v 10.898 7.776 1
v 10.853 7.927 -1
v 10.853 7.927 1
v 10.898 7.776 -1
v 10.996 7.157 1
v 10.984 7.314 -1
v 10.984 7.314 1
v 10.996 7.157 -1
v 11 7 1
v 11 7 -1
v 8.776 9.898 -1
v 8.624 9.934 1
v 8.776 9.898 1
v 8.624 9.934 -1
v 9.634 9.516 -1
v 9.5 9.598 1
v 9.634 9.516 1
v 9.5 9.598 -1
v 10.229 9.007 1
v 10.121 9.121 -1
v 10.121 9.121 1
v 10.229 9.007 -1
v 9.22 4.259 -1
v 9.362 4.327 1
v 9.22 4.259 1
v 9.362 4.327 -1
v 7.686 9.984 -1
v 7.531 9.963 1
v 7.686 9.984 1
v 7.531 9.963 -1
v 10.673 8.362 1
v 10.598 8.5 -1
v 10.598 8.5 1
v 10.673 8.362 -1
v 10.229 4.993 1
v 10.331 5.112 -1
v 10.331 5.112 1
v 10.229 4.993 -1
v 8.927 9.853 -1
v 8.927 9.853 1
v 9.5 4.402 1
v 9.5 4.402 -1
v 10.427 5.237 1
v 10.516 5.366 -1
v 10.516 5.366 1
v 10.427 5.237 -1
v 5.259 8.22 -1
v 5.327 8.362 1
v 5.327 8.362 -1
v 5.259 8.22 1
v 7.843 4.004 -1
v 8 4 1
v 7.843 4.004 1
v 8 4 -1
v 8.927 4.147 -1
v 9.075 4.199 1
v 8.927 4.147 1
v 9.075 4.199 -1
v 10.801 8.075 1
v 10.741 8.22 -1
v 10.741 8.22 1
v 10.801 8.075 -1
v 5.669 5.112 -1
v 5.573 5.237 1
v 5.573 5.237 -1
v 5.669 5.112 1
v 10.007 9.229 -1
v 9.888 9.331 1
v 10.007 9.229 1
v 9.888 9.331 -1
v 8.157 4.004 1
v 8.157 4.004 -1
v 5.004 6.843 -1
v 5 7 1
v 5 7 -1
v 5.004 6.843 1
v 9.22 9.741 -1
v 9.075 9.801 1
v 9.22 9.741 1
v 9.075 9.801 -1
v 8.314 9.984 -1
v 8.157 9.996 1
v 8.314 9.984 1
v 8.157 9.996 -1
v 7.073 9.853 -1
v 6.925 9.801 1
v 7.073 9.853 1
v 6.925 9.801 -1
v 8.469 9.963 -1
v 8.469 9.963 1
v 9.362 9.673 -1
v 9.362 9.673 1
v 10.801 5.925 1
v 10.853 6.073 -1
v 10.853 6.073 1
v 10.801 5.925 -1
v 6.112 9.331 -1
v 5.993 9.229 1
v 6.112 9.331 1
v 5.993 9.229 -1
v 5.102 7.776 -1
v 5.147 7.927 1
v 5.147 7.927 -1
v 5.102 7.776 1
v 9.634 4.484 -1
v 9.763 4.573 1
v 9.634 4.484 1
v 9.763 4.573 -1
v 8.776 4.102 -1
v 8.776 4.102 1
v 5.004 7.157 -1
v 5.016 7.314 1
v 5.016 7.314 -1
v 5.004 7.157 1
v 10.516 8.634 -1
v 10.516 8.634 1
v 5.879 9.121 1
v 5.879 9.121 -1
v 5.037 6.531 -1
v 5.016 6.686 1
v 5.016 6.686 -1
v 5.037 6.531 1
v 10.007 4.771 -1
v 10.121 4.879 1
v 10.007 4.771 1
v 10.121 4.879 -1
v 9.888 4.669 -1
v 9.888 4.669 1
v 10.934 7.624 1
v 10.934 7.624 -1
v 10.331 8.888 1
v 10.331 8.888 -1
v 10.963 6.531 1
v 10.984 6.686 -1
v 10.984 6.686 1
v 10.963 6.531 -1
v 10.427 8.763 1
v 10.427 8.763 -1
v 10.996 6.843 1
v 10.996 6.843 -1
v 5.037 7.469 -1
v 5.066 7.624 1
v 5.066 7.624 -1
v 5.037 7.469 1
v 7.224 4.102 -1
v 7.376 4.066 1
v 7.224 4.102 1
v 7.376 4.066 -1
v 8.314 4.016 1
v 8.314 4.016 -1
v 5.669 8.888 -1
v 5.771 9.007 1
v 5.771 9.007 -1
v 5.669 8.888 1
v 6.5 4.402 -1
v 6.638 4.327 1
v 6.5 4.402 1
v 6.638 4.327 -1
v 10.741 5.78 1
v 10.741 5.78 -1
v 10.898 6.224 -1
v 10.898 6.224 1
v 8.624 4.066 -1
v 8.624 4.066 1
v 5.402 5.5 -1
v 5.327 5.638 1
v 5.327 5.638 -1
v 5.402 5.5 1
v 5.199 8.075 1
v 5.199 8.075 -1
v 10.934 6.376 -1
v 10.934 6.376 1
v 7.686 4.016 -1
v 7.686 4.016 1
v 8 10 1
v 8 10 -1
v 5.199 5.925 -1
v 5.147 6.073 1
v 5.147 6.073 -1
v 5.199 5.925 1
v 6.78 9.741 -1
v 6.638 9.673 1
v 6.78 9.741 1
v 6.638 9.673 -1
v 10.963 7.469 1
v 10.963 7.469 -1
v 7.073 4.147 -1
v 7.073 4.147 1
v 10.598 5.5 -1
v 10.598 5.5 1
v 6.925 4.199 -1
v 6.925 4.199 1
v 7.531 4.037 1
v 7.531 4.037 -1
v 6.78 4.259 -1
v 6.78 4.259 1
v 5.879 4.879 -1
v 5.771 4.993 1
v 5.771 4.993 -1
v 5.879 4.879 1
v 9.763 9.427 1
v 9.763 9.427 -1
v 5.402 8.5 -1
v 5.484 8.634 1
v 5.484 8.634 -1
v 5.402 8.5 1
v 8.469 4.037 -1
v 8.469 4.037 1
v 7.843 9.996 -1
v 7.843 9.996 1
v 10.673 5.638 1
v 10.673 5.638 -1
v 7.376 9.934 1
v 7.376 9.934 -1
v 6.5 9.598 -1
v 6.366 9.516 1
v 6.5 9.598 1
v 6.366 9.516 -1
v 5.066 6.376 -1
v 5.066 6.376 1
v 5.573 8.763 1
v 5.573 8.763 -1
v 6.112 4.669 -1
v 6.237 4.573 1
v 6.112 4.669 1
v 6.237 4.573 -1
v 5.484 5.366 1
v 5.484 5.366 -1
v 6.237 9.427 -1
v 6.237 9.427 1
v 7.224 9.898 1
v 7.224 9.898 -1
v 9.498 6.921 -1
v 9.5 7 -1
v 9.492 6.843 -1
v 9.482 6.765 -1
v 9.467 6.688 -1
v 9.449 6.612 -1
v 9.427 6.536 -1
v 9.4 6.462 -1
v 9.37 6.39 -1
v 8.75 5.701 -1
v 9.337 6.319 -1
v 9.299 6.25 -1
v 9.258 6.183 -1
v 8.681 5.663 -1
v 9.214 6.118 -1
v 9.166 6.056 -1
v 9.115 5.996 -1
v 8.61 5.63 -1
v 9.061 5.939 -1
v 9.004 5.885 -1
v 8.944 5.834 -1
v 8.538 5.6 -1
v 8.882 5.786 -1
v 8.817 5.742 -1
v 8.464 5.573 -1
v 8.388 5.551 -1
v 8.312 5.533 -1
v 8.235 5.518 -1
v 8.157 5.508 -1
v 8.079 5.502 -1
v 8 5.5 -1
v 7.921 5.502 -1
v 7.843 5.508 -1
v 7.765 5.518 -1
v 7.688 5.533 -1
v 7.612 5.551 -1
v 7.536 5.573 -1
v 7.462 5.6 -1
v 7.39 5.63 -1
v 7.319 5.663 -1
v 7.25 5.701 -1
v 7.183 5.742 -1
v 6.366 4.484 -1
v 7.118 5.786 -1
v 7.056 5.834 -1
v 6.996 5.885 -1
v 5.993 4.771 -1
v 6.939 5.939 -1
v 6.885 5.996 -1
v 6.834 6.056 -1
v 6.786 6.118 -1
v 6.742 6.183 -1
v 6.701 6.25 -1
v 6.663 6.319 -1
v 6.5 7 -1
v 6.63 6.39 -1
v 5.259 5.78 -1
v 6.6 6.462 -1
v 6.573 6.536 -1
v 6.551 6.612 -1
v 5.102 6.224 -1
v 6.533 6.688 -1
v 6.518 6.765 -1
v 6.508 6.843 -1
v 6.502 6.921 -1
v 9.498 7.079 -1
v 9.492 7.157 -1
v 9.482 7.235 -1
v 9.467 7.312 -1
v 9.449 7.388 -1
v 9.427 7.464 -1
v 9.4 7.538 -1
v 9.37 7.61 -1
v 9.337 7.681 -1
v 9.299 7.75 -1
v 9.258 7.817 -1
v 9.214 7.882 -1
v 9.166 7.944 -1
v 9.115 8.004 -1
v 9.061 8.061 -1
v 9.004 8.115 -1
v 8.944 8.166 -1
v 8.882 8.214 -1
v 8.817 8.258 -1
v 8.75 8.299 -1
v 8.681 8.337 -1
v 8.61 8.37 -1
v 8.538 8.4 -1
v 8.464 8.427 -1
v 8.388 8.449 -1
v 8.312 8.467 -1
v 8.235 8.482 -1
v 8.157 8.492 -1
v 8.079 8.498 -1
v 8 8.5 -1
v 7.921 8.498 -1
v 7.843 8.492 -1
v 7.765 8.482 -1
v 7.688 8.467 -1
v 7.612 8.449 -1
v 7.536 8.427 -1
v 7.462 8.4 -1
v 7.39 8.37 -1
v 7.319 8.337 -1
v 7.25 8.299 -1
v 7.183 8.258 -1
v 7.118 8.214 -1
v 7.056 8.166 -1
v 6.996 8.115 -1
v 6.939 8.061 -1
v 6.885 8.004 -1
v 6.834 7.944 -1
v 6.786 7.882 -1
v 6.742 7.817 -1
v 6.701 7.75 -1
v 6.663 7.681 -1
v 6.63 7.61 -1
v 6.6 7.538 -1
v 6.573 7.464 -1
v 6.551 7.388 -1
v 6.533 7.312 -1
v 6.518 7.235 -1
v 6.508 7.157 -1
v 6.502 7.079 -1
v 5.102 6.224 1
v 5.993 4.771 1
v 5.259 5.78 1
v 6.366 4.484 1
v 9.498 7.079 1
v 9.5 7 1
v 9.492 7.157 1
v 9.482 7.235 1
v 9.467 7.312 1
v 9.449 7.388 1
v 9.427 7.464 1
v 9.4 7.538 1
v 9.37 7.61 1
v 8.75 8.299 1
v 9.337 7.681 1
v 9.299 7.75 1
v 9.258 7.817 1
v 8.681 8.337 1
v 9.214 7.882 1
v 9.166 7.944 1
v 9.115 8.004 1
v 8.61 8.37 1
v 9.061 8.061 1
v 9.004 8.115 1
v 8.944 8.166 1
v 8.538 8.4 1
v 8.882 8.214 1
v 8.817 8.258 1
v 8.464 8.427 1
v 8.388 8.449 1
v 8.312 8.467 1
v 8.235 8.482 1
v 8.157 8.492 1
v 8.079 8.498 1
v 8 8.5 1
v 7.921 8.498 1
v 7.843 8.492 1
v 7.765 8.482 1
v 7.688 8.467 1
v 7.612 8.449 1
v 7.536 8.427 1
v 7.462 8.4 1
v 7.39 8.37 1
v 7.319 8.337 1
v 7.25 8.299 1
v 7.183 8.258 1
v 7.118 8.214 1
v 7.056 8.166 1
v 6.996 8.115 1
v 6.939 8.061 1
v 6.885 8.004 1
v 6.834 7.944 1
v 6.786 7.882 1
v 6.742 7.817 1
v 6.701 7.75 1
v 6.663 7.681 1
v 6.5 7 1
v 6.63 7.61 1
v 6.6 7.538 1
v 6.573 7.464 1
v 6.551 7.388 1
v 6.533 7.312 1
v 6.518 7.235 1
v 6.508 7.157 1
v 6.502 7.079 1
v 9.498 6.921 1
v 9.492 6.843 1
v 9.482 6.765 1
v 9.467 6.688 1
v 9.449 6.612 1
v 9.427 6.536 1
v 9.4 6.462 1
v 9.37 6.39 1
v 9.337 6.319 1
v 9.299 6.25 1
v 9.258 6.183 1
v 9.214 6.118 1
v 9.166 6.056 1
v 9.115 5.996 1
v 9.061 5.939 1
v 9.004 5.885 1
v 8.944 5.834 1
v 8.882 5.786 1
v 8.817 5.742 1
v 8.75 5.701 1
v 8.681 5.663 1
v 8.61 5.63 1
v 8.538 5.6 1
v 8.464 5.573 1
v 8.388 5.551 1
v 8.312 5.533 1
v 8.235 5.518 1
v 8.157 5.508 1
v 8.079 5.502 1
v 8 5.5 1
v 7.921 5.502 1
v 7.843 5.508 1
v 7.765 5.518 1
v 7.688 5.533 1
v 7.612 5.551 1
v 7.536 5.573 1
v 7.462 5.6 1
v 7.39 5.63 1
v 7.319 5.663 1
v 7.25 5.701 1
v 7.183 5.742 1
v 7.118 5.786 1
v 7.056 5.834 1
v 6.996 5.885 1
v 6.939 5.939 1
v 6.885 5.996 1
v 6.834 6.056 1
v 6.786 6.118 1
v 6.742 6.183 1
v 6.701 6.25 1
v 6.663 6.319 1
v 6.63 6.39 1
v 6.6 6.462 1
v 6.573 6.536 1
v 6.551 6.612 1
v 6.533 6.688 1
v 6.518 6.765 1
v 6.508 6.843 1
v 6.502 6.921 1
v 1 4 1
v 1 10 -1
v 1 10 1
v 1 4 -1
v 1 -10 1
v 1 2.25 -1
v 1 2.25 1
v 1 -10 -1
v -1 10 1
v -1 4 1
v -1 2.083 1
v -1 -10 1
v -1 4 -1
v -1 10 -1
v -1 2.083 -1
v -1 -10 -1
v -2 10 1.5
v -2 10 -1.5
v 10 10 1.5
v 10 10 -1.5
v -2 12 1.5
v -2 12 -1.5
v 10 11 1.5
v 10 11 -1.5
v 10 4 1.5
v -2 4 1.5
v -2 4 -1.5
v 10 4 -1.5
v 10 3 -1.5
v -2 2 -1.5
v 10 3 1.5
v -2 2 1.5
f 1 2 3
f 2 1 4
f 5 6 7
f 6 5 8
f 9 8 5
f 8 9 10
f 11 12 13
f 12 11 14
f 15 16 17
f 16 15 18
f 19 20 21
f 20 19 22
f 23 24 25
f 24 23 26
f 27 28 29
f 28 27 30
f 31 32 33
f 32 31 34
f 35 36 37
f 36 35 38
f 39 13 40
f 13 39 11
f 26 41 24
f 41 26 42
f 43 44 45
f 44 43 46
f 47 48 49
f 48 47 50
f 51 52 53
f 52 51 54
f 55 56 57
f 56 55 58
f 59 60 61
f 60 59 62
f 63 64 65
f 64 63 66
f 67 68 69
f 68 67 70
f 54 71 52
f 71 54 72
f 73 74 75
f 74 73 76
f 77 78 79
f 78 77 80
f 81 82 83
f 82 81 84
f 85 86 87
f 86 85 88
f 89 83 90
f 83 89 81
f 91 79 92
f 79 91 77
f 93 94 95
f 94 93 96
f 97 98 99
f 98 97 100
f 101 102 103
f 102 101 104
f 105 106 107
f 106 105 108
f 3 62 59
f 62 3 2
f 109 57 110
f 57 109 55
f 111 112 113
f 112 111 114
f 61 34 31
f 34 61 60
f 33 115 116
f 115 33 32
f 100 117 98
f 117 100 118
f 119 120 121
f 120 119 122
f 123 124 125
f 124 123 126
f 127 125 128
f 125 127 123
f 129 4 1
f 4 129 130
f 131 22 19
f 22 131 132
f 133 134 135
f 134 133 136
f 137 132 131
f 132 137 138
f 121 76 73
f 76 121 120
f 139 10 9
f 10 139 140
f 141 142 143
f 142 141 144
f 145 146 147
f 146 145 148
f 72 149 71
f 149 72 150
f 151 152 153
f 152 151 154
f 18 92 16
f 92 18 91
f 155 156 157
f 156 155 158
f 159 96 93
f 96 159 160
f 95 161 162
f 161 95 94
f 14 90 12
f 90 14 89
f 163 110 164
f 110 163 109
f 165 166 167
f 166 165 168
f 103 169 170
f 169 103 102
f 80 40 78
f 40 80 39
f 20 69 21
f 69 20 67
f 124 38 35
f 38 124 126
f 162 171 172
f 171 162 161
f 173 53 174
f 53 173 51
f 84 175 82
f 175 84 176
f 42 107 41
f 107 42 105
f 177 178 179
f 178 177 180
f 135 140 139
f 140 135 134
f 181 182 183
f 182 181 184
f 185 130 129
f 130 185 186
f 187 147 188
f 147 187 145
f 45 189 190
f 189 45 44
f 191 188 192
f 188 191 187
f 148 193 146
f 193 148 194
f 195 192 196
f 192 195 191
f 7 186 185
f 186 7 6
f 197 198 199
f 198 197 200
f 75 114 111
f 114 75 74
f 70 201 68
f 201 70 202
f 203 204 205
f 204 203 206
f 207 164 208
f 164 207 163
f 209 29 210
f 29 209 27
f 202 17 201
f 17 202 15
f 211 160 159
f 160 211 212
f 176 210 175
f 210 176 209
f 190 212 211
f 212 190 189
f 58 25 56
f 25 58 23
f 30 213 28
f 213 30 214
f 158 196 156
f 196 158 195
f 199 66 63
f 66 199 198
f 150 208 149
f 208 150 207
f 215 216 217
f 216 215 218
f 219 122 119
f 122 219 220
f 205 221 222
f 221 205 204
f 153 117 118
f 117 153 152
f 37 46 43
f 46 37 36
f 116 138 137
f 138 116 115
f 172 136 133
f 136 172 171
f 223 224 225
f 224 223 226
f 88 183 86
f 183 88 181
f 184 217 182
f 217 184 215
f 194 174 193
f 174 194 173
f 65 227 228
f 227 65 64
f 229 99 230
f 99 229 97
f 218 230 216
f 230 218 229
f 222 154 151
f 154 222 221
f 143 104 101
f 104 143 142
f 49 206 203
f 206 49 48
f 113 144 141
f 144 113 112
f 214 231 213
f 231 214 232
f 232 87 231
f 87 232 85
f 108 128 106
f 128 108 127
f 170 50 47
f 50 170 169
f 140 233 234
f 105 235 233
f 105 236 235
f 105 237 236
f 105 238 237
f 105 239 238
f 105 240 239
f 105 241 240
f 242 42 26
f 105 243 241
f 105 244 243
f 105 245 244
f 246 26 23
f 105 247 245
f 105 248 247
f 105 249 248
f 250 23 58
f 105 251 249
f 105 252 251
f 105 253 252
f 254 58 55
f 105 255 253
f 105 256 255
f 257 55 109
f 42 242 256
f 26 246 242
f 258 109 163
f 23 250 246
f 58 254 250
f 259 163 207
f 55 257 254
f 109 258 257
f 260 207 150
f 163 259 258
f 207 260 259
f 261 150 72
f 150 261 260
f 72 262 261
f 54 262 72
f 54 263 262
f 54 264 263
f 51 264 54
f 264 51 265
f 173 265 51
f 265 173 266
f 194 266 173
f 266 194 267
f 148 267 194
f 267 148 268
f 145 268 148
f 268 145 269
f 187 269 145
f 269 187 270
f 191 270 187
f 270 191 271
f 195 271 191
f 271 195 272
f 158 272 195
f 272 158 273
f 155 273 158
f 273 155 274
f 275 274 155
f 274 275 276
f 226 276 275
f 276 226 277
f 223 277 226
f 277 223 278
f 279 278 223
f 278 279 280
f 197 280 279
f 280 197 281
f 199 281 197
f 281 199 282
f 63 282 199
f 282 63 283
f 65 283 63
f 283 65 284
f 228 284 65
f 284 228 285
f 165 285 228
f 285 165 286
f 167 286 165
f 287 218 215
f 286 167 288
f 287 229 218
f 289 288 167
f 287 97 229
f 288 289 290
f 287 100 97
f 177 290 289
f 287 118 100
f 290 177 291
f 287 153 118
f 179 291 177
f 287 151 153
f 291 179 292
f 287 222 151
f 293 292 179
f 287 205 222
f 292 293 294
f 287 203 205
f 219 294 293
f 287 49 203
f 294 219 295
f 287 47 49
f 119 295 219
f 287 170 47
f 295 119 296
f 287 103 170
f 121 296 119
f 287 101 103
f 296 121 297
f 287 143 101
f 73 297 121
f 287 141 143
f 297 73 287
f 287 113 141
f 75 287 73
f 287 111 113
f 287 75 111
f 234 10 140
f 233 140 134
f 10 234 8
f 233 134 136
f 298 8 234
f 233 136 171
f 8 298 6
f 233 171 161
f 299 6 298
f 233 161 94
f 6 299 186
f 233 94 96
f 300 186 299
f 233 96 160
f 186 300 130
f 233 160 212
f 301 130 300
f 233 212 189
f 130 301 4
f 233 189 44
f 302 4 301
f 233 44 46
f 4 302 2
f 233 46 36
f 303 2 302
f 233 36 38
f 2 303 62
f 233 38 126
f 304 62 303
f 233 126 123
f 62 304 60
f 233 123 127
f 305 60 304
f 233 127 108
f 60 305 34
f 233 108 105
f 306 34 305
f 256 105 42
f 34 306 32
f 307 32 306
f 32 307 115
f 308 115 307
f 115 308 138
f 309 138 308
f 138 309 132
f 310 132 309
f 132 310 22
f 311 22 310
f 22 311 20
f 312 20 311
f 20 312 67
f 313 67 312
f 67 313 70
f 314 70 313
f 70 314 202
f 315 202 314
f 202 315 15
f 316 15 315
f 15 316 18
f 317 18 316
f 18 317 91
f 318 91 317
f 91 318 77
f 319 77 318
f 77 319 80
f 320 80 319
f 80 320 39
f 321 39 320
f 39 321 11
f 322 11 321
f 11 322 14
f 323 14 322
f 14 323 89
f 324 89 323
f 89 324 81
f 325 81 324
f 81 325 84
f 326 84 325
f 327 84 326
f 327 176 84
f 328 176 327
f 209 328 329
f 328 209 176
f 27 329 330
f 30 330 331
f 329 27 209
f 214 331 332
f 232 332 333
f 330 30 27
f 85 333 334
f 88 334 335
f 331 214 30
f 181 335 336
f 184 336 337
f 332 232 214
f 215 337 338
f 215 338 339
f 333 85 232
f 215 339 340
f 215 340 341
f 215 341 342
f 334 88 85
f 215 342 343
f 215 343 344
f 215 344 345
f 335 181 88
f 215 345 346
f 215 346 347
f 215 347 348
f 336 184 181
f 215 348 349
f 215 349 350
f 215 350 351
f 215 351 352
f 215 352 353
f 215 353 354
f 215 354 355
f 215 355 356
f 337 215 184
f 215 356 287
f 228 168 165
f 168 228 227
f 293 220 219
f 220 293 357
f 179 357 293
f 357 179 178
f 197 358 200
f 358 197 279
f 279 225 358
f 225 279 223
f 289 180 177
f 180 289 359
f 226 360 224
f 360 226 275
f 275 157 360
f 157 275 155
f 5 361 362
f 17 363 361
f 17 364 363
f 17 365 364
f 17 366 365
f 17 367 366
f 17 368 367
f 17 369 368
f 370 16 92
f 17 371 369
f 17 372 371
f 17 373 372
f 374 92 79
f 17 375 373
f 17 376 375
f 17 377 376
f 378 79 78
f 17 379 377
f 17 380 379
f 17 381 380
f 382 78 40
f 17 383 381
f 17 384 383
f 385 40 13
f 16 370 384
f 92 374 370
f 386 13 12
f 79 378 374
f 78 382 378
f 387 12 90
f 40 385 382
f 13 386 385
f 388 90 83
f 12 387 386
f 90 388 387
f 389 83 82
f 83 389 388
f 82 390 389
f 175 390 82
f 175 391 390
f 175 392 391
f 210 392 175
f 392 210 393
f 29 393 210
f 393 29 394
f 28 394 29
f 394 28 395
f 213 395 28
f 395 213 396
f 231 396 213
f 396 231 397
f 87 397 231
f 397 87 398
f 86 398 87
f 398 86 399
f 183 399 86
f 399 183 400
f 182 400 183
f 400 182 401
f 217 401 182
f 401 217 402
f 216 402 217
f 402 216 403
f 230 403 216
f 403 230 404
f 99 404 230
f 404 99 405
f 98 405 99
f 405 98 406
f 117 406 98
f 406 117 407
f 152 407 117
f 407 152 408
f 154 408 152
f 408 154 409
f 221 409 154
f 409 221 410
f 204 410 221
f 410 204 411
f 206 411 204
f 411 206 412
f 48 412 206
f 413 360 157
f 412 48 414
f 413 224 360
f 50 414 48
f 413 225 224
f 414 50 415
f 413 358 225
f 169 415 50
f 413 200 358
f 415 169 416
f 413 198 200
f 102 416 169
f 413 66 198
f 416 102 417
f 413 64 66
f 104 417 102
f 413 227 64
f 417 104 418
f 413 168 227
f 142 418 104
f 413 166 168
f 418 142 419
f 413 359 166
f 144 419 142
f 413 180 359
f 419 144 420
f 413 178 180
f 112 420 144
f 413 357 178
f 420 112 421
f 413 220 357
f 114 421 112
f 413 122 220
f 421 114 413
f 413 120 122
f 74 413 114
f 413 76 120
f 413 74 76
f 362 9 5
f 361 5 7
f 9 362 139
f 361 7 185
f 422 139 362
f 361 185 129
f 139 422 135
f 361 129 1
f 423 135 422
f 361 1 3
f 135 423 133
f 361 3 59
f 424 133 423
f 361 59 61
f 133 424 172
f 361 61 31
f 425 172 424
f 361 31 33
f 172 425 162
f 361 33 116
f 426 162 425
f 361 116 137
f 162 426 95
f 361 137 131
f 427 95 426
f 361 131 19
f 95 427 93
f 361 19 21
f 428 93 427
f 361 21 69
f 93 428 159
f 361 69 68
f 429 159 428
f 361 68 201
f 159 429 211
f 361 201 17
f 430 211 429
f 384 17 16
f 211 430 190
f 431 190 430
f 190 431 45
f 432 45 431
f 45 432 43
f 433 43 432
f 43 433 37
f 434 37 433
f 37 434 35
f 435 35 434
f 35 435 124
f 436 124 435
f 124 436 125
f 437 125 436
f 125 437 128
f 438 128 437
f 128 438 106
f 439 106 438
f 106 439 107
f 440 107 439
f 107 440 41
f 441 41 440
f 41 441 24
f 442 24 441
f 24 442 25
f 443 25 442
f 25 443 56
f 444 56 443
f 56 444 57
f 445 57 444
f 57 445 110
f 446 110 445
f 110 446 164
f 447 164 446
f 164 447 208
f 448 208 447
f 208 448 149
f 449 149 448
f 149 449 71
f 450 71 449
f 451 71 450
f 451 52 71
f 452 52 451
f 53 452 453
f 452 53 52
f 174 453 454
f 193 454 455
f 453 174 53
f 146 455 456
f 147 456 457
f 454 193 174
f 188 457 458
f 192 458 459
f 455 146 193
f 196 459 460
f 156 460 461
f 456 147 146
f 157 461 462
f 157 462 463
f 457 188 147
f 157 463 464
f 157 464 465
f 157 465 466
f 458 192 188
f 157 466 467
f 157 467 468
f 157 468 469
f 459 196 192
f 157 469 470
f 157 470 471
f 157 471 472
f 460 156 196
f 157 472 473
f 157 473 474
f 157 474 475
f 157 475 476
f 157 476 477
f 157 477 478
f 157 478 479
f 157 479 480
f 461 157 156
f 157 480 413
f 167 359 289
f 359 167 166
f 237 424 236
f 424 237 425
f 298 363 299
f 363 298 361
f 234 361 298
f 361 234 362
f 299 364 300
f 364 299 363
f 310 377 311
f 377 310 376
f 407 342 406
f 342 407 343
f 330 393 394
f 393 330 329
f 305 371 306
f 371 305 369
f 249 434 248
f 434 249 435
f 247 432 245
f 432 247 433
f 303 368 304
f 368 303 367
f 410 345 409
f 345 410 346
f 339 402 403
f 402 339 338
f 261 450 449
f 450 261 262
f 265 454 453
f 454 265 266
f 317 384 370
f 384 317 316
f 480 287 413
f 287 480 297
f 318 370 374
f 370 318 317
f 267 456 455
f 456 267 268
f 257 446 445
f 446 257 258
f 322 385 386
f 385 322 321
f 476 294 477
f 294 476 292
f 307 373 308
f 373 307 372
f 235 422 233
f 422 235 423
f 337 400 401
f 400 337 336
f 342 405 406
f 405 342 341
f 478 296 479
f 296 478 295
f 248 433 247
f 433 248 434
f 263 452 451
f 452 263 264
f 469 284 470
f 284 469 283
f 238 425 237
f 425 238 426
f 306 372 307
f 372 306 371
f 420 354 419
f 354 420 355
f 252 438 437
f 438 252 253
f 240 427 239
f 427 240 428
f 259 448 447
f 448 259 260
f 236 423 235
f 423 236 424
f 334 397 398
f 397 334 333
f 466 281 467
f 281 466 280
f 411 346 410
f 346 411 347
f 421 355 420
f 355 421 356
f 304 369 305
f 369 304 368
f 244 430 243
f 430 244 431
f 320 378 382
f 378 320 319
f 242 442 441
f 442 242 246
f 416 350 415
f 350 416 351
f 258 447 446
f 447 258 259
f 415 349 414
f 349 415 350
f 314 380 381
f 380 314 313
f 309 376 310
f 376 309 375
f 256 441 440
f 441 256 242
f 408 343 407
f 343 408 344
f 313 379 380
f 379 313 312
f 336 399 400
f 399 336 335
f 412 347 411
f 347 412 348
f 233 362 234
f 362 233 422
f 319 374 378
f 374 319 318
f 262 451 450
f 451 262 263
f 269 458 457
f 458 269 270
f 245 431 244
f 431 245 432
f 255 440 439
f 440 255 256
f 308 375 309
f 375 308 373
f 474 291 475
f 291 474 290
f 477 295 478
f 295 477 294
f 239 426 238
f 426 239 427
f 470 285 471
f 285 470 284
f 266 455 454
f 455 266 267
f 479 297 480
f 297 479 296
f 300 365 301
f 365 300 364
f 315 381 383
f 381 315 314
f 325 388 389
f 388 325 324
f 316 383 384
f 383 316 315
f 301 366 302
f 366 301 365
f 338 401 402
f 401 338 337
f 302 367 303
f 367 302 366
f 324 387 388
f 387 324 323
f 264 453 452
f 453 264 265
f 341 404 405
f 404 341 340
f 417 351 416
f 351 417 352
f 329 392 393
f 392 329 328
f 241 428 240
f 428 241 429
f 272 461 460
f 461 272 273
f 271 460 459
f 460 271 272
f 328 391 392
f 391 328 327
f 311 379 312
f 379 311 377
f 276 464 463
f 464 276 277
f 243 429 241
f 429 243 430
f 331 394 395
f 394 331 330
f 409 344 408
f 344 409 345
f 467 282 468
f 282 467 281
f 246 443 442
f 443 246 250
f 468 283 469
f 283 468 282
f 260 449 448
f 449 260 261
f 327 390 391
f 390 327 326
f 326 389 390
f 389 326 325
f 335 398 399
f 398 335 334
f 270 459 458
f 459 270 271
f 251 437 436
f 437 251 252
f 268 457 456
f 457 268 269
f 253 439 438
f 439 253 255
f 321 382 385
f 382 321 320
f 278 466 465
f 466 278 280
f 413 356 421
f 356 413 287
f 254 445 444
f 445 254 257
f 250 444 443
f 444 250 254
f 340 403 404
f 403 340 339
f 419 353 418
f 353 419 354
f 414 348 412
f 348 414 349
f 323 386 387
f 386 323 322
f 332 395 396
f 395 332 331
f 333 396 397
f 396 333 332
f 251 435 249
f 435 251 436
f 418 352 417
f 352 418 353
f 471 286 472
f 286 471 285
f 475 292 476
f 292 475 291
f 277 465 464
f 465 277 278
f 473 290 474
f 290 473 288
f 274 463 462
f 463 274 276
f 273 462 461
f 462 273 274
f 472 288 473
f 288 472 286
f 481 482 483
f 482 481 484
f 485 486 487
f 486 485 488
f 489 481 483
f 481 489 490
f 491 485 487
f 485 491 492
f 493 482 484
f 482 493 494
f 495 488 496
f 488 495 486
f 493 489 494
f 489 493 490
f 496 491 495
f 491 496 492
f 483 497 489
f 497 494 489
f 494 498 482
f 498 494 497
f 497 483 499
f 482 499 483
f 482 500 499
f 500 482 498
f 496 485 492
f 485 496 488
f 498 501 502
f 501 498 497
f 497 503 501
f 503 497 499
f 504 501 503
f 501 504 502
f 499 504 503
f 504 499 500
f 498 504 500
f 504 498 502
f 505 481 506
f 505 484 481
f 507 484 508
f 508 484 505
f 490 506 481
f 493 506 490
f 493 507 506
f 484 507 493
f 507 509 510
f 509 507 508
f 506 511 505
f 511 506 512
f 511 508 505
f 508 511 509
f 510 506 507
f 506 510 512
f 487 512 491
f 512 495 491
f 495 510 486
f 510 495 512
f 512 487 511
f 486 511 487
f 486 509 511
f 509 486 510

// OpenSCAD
//=============================================================================
// 3D icon used for ImportModel in MakerVR.
// =============================================================================

module Calipers() {
     // Shaft sizes.
     sw = 2;
     sh = 20;
     sd = 2;

     // Jaw sizes.
     jw = 12;
     jh = 2;
     jd = 3;

     module Shaft() {
          cube([sw, sh, sd], center = true);
     }

     module EndJaw() {
          points = [
               [0, 0],
               [jw, 0],
               [jw, jh/2],
               [0, jh],
               ];
          linear_extrude(height = jd) polygon(points);
     }

     module MovingJaw() {
          points = [
               [0, 0],
               [jw, 0],
               [jw, -jh/2],
               [0, -jh],
               ];
          linear_extrude(height = jd) polygon(points);
     }

     module Ring() {
          difference() {
               cylinder(r = 3, h = 2, center = true);
               cylinder(r = 1.5, h = 3, center = true);
          }
     }

     Shaft();
     translate([-2, 10, -jd/2]) EndJaw();
     translate([-2, 4,  -jd/2]) MovingJaw();
     translate([8,  7,      0]) Ring();
}

Calipers($fn = 120);
